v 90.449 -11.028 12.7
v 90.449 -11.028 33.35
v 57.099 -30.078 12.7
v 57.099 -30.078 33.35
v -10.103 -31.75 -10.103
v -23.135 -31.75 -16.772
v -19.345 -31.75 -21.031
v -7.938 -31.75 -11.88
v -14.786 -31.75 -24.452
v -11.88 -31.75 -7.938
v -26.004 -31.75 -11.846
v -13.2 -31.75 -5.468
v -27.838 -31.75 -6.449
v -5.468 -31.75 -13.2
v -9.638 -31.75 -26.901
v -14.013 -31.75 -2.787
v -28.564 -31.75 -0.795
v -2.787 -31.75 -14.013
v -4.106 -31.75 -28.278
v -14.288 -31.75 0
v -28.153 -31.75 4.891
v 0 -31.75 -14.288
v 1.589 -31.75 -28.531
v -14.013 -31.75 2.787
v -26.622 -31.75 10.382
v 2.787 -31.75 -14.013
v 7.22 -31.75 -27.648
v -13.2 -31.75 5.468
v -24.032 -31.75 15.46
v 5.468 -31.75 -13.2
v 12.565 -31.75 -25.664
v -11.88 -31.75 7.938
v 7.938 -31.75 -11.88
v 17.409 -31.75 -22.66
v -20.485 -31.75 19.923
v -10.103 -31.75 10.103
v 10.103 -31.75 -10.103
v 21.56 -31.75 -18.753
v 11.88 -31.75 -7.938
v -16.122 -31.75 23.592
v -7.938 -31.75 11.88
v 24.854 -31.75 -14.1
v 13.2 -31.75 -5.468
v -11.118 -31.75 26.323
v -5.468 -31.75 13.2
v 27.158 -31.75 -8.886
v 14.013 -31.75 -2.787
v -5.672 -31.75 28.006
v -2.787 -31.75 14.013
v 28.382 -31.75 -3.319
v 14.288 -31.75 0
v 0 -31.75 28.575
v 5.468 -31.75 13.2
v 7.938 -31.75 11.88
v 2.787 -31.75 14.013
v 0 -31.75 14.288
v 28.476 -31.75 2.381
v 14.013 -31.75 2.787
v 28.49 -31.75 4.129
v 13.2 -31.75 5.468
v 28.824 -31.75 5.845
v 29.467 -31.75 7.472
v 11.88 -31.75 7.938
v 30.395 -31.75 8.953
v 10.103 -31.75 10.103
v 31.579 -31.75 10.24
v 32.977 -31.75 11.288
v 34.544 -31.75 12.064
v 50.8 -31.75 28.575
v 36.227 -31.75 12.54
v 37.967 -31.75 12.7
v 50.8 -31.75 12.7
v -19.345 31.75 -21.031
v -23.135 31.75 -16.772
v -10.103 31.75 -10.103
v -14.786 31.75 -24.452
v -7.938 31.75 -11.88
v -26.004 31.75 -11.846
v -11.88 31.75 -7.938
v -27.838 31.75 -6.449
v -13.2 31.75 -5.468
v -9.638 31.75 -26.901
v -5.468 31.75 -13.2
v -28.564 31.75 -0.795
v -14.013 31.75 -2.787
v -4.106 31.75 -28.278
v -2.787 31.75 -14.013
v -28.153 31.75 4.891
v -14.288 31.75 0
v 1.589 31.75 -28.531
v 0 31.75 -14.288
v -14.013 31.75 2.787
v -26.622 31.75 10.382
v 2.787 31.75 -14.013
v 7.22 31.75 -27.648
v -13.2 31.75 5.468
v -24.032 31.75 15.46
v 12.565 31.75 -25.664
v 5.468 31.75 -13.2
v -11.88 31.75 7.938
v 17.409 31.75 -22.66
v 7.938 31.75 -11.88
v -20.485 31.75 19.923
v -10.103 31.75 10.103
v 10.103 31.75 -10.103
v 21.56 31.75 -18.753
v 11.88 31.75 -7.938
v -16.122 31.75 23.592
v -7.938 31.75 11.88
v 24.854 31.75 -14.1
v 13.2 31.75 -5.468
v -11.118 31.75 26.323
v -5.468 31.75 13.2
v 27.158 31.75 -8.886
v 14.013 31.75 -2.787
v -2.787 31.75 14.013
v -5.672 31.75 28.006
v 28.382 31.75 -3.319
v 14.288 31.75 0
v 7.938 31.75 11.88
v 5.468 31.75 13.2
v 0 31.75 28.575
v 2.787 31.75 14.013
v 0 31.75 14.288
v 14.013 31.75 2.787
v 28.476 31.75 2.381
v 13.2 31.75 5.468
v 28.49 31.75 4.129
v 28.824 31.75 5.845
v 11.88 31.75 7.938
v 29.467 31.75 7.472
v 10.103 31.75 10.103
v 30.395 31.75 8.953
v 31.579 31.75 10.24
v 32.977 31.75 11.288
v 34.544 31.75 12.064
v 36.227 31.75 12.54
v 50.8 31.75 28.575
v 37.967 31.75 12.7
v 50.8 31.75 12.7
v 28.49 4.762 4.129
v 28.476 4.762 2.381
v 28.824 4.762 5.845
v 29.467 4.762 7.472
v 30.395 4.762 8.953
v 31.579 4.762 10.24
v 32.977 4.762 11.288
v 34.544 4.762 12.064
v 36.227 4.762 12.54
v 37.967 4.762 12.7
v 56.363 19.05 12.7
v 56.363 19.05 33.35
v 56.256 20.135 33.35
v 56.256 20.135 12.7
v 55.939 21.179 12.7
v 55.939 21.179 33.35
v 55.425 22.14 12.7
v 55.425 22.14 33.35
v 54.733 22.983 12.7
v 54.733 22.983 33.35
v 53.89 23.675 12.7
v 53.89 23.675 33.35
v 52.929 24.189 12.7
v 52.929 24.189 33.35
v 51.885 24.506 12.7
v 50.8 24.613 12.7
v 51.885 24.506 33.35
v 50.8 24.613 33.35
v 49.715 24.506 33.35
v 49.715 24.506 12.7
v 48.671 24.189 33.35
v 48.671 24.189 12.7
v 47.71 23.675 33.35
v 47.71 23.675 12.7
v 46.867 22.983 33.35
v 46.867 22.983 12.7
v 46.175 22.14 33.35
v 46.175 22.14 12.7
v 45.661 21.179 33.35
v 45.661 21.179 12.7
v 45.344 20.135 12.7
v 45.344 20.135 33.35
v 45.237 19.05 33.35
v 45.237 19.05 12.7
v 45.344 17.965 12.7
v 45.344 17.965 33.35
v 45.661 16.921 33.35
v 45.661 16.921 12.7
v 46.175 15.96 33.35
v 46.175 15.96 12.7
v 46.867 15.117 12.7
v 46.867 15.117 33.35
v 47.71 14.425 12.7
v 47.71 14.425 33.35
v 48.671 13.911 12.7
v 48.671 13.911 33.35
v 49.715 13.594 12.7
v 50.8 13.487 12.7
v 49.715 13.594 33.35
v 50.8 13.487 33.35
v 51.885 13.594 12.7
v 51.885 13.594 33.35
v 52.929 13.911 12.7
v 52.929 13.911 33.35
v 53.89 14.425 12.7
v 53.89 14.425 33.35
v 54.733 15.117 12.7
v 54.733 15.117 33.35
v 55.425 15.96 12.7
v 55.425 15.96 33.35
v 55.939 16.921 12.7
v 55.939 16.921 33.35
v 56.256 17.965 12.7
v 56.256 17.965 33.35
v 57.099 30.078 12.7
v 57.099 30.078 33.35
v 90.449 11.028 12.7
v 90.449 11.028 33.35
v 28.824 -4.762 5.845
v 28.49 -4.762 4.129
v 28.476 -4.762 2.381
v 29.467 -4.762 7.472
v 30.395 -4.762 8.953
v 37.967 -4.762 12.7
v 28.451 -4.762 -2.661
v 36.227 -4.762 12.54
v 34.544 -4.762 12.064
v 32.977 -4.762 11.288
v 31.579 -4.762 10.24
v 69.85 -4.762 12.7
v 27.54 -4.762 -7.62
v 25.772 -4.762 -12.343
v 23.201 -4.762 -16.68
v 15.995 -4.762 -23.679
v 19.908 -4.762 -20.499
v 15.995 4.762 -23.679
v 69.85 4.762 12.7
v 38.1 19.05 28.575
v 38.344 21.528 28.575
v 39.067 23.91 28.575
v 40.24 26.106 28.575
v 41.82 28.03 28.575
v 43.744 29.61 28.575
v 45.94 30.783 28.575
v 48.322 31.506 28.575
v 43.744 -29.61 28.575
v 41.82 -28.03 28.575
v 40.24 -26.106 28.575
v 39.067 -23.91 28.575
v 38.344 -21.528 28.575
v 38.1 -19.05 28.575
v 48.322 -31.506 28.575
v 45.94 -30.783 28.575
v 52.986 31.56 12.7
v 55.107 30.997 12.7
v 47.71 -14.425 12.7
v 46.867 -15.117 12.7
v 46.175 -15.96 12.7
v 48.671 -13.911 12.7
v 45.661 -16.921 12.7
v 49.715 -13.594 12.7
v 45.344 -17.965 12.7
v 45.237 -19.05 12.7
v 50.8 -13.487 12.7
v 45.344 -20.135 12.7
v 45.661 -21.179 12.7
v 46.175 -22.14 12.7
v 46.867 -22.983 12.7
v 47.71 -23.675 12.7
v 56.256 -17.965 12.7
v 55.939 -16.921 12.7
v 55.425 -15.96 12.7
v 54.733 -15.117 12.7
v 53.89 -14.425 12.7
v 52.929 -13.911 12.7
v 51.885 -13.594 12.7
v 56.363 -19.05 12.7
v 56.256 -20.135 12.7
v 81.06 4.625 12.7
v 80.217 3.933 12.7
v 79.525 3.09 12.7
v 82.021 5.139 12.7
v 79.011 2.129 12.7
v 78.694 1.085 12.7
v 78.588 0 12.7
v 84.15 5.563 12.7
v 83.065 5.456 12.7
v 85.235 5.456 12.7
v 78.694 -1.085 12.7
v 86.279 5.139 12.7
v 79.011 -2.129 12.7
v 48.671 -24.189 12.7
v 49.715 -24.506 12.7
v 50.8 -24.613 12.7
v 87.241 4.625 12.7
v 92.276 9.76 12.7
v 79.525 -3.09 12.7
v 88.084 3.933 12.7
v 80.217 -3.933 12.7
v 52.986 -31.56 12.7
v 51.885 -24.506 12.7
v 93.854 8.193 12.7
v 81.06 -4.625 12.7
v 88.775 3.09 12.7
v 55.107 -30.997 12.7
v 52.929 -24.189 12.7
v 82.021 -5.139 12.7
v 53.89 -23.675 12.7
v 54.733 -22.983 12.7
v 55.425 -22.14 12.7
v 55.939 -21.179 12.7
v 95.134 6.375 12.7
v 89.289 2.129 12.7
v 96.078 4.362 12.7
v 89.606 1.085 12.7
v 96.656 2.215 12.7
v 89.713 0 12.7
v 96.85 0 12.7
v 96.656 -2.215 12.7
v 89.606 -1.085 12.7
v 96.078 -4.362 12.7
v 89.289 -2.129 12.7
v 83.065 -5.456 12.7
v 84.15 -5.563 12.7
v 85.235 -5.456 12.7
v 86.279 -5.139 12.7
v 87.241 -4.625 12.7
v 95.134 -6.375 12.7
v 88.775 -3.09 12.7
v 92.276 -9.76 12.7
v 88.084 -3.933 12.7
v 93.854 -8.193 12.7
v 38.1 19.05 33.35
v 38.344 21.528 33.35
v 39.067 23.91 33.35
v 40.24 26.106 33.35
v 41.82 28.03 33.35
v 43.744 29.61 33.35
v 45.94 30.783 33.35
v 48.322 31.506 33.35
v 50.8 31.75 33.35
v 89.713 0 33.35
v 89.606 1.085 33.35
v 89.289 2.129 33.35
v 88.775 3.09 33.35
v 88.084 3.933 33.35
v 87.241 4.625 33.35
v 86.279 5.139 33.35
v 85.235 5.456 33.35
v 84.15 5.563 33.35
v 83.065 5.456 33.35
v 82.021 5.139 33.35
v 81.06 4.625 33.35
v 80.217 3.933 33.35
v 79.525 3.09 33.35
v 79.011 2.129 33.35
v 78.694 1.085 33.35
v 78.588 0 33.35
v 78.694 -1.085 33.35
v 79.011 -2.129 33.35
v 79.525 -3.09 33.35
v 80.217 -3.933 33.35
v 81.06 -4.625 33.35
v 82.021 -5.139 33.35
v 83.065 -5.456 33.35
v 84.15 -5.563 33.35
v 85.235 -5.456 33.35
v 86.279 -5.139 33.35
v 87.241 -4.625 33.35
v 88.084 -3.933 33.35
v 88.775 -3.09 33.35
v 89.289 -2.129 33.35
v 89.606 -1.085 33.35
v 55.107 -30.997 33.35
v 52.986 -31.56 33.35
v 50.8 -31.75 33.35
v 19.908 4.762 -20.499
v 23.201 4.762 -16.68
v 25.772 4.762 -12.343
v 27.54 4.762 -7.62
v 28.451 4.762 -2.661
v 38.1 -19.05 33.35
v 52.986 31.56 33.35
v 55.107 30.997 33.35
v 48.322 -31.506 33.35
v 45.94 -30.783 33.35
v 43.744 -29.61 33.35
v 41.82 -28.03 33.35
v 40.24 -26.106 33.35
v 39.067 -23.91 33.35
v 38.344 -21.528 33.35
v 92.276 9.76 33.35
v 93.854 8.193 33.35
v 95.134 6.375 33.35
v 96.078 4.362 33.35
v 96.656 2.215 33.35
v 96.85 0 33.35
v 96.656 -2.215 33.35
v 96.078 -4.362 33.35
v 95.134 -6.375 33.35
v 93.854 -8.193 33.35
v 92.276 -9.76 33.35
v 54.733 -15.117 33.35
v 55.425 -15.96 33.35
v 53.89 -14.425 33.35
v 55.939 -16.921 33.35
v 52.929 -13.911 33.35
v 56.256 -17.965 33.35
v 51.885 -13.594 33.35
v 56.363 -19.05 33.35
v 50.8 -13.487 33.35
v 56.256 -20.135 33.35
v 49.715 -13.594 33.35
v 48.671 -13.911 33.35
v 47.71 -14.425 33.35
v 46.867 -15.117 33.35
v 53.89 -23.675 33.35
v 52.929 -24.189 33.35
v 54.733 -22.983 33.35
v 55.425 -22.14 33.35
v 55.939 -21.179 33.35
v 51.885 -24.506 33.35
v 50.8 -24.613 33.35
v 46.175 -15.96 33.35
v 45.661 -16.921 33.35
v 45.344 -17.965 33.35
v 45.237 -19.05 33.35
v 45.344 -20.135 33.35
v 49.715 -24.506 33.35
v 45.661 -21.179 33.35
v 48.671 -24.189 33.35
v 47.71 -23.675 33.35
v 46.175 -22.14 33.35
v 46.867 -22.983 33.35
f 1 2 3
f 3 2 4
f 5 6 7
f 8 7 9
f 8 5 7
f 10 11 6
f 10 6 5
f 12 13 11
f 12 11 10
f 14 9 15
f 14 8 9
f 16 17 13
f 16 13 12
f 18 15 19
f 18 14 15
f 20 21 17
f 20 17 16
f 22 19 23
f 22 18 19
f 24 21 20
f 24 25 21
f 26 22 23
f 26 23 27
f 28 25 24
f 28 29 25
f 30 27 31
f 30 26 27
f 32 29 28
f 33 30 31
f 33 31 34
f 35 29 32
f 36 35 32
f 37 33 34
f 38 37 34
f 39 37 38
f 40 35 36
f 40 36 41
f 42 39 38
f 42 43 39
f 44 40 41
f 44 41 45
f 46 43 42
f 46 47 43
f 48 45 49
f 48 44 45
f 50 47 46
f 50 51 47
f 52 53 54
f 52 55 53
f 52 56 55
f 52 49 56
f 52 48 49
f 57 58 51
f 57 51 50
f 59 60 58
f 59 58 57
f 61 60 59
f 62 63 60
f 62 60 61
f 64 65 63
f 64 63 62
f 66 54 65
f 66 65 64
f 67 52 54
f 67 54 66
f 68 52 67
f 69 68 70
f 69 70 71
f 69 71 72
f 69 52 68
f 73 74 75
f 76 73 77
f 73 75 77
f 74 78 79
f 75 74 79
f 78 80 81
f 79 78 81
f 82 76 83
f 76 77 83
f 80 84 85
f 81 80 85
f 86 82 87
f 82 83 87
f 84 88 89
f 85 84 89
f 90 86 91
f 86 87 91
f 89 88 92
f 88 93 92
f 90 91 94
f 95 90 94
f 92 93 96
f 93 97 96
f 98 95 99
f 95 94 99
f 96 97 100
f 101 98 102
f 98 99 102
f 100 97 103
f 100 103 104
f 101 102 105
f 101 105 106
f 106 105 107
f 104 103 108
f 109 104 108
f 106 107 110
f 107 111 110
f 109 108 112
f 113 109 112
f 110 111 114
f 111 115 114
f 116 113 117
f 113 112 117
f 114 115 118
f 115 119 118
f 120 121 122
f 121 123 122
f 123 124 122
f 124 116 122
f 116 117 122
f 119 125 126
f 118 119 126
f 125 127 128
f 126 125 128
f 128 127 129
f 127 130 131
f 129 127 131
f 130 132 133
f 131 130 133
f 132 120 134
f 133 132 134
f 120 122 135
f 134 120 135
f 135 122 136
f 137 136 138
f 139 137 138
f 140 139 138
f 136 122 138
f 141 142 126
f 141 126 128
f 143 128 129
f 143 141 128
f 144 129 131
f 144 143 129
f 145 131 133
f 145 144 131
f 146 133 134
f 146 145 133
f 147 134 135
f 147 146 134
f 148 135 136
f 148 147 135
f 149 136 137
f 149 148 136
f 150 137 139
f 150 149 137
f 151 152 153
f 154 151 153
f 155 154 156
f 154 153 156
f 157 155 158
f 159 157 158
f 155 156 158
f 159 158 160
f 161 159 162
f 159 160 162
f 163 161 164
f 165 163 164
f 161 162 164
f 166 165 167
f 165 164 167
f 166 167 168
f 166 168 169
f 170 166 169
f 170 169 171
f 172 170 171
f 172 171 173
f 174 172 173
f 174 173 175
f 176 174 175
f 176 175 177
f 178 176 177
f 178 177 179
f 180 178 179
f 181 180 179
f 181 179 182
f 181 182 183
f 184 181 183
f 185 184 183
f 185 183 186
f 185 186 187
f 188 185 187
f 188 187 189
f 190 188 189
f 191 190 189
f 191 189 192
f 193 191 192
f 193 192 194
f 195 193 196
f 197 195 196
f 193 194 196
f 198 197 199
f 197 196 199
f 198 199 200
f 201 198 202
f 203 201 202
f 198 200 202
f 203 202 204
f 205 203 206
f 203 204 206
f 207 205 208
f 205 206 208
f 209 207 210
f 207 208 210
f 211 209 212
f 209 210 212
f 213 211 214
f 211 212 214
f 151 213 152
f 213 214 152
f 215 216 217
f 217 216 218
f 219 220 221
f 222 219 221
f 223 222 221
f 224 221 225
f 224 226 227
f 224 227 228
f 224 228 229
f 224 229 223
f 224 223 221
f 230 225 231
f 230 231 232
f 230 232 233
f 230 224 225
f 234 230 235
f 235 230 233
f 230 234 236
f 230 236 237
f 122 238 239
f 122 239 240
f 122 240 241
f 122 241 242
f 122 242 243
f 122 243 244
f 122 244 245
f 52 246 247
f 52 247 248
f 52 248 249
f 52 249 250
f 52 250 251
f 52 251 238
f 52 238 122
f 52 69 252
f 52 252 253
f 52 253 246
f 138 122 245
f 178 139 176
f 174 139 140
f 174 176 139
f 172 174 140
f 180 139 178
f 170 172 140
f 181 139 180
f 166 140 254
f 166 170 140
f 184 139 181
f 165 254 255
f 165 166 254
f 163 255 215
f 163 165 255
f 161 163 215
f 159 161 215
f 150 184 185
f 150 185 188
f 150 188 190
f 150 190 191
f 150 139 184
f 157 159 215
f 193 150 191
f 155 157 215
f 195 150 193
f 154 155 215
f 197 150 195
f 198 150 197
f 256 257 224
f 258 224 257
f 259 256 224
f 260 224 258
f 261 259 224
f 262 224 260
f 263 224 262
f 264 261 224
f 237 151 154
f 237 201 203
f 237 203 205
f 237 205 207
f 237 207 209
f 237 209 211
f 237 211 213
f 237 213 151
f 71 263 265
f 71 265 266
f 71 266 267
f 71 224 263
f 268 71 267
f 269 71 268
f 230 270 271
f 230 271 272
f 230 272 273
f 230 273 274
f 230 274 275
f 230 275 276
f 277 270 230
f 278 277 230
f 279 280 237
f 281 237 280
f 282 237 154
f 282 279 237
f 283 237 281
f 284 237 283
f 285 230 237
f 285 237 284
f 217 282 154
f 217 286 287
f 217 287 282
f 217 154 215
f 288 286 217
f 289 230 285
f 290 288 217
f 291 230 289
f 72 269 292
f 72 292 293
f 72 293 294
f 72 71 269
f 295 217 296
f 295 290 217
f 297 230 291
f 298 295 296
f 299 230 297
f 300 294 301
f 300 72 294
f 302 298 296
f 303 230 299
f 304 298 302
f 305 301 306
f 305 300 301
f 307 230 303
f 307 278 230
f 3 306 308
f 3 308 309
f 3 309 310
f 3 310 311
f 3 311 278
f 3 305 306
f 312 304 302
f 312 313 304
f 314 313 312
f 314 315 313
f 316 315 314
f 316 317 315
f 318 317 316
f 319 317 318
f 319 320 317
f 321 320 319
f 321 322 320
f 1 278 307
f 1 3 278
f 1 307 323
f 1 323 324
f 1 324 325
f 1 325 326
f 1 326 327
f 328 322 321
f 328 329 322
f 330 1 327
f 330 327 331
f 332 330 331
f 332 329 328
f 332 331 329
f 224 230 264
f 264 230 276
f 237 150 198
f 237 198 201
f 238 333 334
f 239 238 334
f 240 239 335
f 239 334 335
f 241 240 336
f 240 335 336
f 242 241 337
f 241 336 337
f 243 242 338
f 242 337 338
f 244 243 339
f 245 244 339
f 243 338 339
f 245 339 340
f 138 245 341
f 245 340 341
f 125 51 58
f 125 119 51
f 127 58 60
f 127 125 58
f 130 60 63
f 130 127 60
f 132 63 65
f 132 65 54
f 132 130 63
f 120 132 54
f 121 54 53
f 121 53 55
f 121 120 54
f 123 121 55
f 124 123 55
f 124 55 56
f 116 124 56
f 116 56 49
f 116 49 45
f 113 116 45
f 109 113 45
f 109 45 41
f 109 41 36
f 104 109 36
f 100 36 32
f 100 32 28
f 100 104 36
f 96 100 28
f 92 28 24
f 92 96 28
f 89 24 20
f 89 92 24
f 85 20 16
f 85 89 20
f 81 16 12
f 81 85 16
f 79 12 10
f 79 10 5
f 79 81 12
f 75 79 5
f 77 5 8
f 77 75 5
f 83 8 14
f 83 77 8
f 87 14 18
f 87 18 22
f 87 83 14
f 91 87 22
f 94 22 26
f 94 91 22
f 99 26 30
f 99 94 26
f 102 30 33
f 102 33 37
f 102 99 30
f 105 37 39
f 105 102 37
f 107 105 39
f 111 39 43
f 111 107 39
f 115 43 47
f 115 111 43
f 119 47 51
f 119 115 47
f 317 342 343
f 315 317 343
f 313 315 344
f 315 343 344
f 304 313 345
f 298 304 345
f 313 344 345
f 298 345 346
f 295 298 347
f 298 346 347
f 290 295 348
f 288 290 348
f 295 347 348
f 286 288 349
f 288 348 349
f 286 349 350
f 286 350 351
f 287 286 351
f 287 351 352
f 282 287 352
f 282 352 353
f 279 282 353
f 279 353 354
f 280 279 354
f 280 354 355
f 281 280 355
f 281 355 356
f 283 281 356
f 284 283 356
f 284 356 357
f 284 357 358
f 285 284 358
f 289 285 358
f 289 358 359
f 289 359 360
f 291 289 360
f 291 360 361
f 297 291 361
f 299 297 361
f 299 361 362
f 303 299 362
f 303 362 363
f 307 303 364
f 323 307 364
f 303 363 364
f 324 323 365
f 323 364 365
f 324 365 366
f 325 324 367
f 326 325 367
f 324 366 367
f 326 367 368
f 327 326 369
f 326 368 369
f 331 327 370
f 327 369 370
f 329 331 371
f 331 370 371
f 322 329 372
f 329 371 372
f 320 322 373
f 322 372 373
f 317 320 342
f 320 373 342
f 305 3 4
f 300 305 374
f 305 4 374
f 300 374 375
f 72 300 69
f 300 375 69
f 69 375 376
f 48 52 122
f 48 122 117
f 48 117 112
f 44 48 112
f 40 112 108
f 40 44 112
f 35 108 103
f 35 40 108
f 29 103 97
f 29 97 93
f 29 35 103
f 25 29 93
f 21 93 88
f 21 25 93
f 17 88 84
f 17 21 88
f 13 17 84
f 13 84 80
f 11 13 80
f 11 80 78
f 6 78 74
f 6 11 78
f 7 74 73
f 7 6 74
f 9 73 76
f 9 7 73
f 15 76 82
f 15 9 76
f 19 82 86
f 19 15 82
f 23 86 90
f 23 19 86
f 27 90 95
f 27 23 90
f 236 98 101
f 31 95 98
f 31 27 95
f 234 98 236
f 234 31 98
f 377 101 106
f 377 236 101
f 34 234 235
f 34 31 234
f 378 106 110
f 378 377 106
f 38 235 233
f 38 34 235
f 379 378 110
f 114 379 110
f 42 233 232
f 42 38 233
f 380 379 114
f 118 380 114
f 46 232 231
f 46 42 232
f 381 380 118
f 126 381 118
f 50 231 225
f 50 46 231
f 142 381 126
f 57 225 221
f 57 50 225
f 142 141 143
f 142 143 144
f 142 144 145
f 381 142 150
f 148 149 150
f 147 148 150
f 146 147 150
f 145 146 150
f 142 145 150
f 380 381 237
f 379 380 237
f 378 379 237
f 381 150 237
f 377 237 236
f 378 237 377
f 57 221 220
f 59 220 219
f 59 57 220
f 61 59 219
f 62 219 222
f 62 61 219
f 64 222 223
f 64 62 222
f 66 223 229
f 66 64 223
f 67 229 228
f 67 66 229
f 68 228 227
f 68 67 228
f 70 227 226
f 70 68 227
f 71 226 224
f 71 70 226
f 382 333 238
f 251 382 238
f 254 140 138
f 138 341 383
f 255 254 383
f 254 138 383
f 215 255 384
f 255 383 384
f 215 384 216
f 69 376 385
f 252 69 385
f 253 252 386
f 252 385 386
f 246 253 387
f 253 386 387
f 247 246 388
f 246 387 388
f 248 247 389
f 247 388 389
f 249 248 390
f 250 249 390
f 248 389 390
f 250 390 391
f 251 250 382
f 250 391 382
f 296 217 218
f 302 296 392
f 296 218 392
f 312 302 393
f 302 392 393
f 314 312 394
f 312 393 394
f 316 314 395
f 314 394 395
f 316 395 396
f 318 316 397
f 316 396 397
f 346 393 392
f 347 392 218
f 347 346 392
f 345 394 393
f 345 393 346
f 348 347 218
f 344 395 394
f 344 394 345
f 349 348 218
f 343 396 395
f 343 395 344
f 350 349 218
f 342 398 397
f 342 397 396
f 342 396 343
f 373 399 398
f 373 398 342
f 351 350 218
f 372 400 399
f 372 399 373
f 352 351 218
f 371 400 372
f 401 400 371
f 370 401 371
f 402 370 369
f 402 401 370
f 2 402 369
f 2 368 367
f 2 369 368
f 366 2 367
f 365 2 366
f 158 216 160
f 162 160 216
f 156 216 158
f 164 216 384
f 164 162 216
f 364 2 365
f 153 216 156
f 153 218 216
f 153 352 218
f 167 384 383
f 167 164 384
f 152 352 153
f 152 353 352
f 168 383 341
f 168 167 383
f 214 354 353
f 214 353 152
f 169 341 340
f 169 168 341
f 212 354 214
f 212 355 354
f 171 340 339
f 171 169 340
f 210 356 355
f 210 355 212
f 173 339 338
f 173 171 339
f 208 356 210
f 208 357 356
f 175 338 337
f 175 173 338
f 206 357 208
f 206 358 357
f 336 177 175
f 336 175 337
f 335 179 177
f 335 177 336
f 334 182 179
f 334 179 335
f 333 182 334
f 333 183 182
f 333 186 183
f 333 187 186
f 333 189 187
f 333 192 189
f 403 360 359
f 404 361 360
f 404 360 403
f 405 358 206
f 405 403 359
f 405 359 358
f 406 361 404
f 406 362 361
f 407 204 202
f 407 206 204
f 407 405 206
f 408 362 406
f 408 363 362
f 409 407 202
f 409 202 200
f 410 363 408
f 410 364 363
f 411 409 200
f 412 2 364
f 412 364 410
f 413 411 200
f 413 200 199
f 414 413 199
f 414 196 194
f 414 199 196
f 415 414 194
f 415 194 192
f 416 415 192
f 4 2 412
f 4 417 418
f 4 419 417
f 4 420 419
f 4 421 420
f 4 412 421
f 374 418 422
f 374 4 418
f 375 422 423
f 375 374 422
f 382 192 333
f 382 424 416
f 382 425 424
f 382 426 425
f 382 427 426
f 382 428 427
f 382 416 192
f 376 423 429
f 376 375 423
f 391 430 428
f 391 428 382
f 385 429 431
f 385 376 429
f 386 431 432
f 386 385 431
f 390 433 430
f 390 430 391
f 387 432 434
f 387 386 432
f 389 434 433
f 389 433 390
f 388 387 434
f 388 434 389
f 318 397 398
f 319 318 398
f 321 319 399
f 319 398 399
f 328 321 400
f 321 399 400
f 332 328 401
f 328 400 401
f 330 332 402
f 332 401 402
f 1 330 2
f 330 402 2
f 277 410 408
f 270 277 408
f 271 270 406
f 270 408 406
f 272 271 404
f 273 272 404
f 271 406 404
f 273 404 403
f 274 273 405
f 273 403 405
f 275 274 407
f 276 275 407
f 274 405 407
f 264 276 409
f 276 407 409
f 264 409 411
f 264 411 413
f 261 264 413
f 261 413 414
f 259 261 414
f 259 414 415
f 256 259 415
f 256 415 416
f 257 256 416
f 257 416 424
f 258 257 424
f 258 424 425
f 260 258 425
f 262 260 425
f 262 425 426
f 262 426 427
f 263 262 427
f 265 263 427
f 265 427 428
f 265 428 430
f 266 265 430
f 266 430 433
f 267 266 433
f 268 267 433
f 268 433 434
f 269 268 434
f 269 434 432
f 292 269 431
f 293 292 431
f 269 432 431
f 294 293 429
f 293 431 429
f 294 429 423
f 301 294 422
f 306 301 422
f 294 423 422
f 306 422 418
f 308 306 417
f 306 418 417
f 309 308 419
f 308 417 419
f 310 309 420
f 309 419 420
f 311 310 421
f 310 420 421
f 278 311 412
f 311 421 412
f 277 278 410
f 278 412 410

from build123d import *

# Parameters (mm, degrees)
F0_R     = 14.2875
F1_DEPTH = 31.75
F2_DEPTH = 4.7625
F4_DEPTH = 25.4
F5_DEPTH = 25.4
F6_DEPTH = 4.7752
F3_R     = 5.5626
F7_DEPTH = 25.4


with BuildPart() as f1:
    # F0 (on Front) → F1 (new body, symmetric)
    with BuildSketch(Plane.XZ):
        with BuildLine():
            Line((38.1, 28.575), (0, 28.575))
            ThreePointArc((0, 28.575), (-27.3235693319, -8.3638020041), (15.9950252975, -23.6788891364))
            ThreePointArc((15.9950252975, -23.6788891364), (25.7719232537, -12.3425522809), (28.4756083945, 2.38125))
            ThreePointArc((28.4756083945, 2.38125), (30.9572676717, 9.6234554837), (37.9674778593, 12.7))
            Line((37.9674778593, 12.7), (69.85, 12.7))
            Line((69.85, 12.7), (96.8502, 12.7))
            Line((96.8502, 12.7), (96.8502, 33.3502))
            Line((96.8502, 33.3502), (38.1, 33.3502))
            Line((38.1, 33.3502), (38.1, 28.575))
        make_face()
        Circle(F0_R, mode=Mode.SUBTRACT)
    extrude(amount=F1_DEPTH, both=True)

    # F0 (on Front) → F2 (join, symmetric)
    with BuildSketch(Plane.XZ):
        with BuildLine():
            ThreePointArc((28.4756083945, 2.38125), (25.7719232537, -12.3425522809), (15.9950252975, -23.6788891364))
            Line((15.9950252975, -23.6788891364), (69.85, 12.7))
            Line((69.85, 12.7), (37.9674778593, 12.7))
            ThreePointArc((37.9674778593, 12.7), (30.9572676717, 9.6234554837), (28.4756083945, 2.38125))
        make_face()
    extrude(amount=F2_DEPTH, both=True)

    # F3 (on face) → F4 (cut)
    with BuildSketch(Plane.XY.offset(33.3502)):
        with BuildLine():
            ThreePointArc((50.8, 31.75), (54.0586759125, 31.3248128824), (57.0991554441, 30.0777214642))
            Line((57.0991554441, 30.0777214642), (90.4493554441, 11.0277214642))
            ThreePointArc((90.4493554441, 11.0277214642), (95.1340352623, 6.3753715915), (96.8502, 0))
            Line((96.8502, 0), (96.8502, 31.75))
            Line((96.8502, 31.75), (50.8, 31.75))
        make_face()
    extrude(amount=-F4_DEPTH, mode=Mode.SUBTRACT)

    # F3 (on face) → F5 (cut)
    with BuildSketch(Plane.XY.offset(33.3502)):
        with BuildLine():
            Line((96.8502, -31.75), (96.8502, 0))
            ThreePointArc((96.8502, 0), (95.1340352623, -6.3753715915), (90.4493554441, -11.0277214642))
            Line((90.4493554441, -11.0277214642), (57.0991554441, -30.0777214642))
            ThreePointArc((57.0991554441, -30.0777214642), (54.0586759125, -31.3248128824), (50.8, -31.75))
            Line((50.8, -31.75), (96.8502, -31.75))
        make_face()
    extrude(amount=-F5_DEPTH, mode=Mode.SUBTRACT)

    # F3 (on face) → F6 (cut)
    with BuildSketch(Plane.XY.offset(33.3502)):
        with BuildLine():
            ThreePointArc((50.8, -31.75), (41.8197438789, -28.0302561211), (38.1, -19.05))
            Line((38.1, -19.05), (38.1, -31.75))
            Line((38.1, -31.75), (50.8, -31.75))
        make_face()
        with BuildLine():
            ThreePointArc((38.1, 19.05), (41.8197438789, 28.0302561211), (50.8, 31.75))
            Line((50.8, 31.75), (38.1, 31.75))
            Line((38.1, 31.75), (38.1, 19.05))
        make_face()
    extrude(amount=-F6_DEPTH, mode=Mode.SUBTRACT)

    # F3 (on face) → F7 (cut)
    with BuildSketch(Plane.XY.offset(33.3502)):
        with Locations((84.1502, 0)):
            Circle(F3_R)
        with Locations((50.8, 19.05)):
            Circle(F3_R)
        with Locations((50.8, -19.05)):
            Circle(F3_R)
    extrude(amount=-F7_DEPTH, mode=Mode.SUBTRACT)


solid = f1.part
